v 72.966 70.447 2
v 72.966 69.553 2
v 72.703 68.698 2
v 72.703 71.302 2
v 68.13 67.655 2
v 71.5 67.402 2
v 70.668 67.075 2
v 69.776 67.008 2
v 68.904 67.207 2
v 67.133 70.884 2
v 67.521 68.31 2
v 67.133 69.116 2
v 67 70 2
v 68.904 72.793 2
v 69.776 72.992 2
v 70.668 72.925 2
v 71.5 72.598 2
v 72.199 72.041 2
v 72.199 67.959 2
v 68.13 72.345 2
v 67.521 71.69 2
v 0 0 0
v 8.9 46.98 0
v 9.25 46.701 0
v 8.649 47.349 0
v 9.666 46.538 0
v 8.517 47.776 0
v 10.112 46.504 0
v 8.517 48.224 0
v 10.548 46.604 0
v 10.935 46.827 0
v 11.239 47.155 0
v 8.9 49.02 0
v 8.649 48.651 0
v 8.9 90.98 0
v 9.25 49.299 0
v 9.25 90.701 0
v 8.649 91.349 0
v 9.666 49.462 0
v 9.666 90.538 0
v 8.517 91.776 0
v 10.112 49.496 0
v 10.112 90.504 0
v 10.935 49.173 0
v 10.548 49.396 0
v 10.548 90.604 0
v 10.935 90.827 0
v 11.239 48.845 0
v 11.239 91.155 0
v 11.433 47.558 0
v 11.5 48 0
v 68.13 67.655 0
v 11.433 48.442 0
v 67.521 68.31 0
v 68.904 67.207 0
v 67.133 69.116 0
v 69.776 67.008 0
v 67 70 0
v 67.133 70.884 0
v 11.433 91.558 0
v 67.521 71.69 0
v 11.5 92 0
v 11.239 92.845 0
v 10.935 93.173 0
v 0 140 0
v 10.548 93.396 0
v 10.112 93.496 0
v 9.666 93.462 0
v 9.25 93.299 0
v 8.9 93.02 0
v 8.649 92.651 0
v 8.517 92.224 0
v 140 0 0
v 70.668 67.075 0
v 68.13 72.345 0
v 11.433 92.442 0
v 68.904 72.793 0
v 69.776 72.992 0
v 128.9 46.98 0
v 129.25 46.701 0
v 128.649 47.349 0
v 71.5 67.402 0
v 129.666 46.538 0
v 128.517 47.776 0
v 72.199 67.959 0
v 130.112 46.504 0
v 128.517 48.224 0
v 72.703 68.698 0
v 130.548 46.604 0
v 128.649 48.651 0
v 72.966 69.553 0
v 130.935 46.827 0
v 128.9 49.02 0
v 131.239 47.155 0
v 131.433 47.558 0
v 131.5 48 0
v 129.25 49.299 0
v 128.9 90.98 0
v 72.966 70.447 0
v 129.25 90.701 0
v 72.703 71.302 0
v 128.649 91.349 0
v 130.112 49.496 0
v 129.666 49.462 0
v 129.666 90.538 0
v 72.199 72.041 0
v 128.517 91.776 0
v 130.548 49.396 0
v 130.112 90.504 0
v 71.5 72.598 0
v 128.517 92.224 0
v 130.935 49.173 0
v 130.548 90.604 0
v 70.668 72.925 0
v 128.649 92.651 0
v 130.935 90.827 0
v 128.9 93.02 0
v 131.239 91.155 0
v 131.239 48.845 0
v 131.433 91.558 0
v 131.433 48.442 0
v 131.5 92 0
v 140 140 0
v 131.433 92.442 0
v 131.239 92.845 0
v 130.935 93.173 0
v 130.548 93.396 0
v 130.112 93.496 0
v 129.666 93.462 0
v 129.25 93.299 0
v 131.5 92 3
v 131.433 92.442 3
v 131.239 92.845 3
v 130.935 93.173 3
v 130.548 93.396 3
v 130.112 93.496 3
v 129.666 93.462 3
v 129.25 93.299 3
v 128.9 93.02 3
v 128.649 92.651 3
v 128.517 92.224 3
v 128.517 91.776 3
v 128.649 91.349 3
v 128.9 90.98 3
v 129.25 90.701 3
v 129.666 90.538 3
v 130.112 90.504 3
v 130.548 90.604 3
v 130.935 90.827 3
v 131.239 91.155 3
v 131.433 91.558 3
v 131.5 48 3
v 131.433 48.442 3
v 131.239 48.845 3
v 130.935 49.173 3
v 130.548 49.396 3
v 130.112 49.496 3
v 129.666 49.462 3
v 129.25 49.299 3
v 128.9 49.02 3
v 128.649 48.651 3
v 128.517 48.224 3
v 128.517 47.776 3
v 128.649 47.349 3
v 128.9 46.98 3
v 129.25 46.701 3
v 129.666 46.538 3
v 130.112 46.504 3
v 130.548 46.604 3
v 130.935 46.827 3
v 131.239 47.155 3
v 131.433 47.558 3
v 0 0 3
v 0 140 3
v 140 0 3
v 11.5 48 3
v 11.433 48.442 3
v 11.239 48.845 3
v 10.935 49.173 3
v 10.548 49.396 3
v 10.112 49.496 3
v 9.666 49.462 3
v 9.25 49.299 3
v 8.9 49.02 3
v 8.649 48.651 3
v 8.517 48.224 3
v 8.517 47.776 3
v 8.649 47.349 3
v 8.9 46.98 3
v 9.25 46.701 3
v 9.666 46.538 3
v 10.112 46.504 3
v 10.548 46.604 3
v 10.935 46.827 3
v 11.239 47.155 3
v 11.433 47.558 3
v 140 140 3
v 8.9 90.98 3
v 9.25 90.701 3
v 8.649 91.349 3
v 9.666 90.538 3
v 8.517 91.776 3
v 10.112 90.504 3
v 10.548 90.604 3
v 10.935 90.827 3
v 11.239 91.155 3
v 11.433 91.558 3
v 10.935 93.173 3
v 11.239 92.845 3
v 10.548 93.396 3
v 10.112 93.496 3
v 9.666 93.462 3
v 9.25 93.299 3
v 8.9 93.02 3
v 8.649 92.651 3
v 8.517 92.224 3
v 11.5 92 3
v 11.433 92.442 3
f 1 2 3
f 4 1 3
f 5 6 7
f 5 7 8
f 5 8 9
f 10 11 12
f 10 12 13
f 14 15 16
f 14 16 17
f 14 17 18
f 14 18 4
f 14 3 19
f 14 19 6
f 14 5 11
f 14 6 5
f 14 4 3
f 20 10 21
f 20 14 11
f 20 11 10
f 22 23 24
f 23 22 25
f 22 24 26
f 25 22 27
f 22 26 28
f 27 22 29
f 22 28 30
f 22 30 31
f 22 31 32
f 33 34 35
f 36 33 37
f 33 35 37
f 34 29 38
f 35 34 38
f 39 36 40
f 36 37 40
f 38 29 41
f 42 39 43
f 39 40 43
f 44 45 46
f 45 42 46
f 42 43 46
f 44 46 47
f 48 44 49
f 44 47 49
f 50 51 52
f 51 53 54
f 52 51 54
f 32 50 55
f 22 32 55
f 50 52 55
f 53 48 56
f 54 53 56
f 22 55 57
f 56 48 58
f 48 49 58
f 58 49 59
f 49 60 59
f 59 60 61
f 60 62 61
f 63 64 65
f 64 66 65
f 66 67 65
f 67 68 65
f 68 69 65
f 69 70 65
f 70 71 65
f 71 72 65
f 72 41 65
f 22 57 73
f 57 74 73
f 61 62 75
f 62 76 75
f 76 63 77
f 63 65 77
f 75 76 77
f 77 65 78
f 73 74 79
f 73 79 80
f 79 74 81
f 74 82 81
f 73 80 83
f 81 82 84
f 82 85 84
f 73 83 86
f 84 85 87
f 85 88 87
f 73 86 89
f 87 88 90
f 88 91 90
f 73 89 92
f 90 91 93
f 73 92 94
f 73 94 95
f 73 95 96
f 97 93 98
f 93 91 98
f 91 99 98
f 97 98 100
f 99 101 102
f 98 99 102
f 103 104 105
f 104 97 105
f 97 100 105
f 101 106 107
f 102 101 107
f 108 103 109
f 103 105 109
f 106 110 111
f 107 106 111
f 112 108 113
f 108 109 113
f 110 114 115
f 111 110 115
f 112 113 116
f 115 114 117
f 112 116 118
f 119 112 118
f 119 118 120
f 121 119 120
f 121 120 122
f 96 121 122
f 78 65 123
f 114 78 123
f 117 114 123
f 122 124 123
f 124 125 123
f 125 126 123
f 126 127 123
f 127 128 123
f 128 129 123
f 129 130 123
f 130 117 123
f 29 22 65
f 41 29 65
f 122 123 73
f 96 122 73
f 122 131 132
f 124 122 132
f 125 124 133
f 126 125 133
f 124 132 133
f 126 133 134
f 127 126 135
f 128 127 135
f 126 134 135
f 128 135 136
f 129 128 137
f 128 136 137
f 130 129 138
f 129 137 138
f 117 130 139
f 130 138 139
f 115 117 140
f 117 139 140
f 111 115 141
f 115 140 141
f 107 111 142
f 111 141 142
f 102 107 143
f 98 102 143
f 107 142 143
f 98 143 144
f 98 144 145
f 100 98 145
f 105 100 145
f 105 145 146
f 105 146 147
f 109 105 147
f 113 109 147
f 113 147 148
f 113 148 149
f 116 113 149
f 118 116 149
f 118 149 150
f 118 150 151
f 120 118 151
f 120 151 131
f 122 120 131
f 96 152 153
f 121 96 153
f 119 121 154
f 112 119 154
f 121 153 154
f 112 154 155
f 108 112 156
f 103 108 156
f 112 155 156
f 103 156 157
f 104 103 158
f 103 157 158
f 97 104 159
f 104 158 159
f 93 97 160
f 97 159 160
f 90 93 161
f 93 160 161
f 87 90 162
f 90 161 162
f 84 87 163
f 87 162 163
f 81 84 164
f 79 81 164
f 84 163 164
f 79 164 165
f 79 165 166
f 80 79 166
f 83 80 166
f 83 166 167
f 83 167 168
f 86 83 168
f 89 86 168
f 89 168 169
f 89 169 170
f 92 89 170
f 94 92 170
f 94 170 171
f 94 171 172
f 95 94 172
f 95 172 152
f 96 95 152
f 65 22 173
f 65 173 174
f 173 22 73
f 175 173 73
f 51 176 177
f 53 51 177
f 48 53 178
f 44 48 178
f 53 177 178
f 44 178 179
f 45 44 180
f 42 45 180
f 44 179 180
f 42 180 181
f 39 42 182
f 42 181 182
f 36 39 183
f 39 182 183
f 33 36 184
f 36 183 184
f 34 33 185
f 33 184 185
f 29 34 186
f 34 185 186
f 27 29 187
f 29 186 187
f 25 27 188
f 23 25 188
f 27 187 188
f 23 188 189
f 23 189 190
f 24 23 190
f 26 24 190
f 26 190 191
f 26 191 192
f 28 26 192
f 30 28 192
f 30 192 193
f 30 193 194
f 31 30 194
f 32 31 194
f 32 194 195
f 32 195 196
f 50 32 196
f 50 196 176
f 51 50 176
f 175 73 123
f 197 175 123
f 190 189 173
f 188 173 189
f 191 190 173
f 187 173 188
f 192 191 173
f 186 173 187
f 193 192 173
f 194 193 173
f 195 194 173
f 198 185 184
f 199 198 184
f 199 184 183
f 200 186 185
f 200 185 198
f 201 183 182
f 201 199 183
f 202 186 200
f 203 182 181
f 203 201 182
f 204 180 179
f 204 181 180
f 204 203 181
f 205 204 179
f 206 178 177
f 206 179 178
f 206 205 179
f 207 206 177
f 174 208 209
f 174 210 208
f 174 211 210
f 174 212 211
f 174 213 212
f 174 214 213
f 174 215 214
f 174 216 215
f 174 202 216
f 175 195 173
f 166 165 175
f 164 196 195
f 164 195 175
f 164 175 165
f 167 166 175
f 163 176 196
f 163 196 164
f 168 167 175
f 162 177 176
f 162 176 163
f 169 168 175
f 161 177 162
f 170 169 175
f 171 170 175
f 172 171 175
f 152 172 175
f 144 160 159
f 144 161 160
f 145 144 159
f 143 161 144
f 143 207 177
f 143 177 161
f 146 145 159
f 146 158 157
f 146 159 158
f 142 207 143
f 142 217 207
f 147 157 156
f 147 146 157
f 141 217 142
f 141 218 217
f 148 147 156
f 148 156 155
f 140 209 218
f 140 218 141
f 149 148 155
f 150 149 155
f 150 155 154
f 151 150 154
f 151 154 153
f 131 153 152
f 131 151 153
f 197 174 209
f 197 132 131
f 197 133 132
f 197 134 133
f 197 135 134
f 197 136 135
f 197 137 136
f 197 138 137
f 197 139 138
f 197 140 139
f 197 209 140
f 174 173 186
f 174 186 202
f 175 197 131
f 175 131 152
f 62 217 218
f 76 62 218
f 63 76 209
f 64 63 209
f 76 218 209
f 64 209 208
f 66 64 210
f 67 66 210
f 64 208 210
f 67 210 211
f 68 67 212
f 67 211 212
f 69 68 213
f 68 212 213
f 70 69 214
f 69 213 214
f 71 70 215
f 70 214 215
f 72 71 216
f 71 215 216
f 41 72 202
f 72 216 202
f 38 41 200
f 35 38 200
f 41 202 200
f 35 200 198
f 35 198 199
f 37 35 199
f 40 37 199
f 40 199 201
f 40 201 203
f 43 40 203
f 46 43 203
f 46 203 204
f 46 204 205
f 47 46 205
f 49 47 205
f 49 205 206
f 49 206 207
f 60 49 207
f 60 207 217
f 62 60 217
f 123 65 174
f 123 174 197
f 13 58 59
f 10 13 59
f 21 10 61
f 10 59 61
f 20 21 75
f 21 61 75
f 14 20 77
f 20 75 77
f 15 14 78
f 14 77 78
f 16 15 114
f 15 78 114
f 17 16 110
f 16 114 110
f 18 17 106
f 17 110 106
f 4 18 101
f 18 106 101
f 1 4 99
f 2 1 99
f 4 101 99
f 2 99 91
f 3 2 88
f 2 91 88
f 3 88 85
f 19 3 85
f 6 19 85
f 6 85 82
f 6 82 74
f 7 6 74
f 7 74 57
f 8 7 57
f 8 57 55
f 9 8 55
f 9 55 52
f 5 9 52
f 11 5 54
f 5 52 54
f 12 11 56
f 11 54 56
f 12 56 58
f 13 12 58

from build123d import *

# Parameters (mm, degrees)
SKETCH1_W             = 140
SKETCH1_H             = 140
BOSS_EXTRUDE1_DEPTH   = 3
M3X0_5_TAPPED_HOLE1_D = 3
SKETCH8_R             = 3
CUT_EXTRUDE2_DEPTH    = 2


with BuildPart() as part:
    # Sketch1 → Boss-Extrude1 (new body)
    with BuildSketch(Plane.XY):
        with Locations((70, 70)):
            Rectangle(SKETCH1_W, SKETCH1_H)
    extrude(amount=BOSS_EXTRUDE1_DEPTH)

    # M3x0.5 Tapped Hole1 (through all)
    with Locations(Plane(origin=(0, 0, 0), x_dir=(-1, 0, 0), z_dir=(0, 0, -1))):
        with Locations((-130, 92), (-130, 48), (-10, 92), (-10, 48)):
            Hole(M3X0_5_TAPPED_HOLE1_D / 2)

    # Sketch8 → Cut-Extrude2 (cut)
    with BuildSketch(Plane(origin=(0, 0, 0), x_dir=(-1, 0, 0), z_dir=(0, 0, -1))):
        with Locations((-70, 70)):
            Circle(SKETCH8_R)
    extrude(amount=-CUT_EXTRUDE2_DEPTH, mode=Mode.SUBTRACT)


solid = part.part
